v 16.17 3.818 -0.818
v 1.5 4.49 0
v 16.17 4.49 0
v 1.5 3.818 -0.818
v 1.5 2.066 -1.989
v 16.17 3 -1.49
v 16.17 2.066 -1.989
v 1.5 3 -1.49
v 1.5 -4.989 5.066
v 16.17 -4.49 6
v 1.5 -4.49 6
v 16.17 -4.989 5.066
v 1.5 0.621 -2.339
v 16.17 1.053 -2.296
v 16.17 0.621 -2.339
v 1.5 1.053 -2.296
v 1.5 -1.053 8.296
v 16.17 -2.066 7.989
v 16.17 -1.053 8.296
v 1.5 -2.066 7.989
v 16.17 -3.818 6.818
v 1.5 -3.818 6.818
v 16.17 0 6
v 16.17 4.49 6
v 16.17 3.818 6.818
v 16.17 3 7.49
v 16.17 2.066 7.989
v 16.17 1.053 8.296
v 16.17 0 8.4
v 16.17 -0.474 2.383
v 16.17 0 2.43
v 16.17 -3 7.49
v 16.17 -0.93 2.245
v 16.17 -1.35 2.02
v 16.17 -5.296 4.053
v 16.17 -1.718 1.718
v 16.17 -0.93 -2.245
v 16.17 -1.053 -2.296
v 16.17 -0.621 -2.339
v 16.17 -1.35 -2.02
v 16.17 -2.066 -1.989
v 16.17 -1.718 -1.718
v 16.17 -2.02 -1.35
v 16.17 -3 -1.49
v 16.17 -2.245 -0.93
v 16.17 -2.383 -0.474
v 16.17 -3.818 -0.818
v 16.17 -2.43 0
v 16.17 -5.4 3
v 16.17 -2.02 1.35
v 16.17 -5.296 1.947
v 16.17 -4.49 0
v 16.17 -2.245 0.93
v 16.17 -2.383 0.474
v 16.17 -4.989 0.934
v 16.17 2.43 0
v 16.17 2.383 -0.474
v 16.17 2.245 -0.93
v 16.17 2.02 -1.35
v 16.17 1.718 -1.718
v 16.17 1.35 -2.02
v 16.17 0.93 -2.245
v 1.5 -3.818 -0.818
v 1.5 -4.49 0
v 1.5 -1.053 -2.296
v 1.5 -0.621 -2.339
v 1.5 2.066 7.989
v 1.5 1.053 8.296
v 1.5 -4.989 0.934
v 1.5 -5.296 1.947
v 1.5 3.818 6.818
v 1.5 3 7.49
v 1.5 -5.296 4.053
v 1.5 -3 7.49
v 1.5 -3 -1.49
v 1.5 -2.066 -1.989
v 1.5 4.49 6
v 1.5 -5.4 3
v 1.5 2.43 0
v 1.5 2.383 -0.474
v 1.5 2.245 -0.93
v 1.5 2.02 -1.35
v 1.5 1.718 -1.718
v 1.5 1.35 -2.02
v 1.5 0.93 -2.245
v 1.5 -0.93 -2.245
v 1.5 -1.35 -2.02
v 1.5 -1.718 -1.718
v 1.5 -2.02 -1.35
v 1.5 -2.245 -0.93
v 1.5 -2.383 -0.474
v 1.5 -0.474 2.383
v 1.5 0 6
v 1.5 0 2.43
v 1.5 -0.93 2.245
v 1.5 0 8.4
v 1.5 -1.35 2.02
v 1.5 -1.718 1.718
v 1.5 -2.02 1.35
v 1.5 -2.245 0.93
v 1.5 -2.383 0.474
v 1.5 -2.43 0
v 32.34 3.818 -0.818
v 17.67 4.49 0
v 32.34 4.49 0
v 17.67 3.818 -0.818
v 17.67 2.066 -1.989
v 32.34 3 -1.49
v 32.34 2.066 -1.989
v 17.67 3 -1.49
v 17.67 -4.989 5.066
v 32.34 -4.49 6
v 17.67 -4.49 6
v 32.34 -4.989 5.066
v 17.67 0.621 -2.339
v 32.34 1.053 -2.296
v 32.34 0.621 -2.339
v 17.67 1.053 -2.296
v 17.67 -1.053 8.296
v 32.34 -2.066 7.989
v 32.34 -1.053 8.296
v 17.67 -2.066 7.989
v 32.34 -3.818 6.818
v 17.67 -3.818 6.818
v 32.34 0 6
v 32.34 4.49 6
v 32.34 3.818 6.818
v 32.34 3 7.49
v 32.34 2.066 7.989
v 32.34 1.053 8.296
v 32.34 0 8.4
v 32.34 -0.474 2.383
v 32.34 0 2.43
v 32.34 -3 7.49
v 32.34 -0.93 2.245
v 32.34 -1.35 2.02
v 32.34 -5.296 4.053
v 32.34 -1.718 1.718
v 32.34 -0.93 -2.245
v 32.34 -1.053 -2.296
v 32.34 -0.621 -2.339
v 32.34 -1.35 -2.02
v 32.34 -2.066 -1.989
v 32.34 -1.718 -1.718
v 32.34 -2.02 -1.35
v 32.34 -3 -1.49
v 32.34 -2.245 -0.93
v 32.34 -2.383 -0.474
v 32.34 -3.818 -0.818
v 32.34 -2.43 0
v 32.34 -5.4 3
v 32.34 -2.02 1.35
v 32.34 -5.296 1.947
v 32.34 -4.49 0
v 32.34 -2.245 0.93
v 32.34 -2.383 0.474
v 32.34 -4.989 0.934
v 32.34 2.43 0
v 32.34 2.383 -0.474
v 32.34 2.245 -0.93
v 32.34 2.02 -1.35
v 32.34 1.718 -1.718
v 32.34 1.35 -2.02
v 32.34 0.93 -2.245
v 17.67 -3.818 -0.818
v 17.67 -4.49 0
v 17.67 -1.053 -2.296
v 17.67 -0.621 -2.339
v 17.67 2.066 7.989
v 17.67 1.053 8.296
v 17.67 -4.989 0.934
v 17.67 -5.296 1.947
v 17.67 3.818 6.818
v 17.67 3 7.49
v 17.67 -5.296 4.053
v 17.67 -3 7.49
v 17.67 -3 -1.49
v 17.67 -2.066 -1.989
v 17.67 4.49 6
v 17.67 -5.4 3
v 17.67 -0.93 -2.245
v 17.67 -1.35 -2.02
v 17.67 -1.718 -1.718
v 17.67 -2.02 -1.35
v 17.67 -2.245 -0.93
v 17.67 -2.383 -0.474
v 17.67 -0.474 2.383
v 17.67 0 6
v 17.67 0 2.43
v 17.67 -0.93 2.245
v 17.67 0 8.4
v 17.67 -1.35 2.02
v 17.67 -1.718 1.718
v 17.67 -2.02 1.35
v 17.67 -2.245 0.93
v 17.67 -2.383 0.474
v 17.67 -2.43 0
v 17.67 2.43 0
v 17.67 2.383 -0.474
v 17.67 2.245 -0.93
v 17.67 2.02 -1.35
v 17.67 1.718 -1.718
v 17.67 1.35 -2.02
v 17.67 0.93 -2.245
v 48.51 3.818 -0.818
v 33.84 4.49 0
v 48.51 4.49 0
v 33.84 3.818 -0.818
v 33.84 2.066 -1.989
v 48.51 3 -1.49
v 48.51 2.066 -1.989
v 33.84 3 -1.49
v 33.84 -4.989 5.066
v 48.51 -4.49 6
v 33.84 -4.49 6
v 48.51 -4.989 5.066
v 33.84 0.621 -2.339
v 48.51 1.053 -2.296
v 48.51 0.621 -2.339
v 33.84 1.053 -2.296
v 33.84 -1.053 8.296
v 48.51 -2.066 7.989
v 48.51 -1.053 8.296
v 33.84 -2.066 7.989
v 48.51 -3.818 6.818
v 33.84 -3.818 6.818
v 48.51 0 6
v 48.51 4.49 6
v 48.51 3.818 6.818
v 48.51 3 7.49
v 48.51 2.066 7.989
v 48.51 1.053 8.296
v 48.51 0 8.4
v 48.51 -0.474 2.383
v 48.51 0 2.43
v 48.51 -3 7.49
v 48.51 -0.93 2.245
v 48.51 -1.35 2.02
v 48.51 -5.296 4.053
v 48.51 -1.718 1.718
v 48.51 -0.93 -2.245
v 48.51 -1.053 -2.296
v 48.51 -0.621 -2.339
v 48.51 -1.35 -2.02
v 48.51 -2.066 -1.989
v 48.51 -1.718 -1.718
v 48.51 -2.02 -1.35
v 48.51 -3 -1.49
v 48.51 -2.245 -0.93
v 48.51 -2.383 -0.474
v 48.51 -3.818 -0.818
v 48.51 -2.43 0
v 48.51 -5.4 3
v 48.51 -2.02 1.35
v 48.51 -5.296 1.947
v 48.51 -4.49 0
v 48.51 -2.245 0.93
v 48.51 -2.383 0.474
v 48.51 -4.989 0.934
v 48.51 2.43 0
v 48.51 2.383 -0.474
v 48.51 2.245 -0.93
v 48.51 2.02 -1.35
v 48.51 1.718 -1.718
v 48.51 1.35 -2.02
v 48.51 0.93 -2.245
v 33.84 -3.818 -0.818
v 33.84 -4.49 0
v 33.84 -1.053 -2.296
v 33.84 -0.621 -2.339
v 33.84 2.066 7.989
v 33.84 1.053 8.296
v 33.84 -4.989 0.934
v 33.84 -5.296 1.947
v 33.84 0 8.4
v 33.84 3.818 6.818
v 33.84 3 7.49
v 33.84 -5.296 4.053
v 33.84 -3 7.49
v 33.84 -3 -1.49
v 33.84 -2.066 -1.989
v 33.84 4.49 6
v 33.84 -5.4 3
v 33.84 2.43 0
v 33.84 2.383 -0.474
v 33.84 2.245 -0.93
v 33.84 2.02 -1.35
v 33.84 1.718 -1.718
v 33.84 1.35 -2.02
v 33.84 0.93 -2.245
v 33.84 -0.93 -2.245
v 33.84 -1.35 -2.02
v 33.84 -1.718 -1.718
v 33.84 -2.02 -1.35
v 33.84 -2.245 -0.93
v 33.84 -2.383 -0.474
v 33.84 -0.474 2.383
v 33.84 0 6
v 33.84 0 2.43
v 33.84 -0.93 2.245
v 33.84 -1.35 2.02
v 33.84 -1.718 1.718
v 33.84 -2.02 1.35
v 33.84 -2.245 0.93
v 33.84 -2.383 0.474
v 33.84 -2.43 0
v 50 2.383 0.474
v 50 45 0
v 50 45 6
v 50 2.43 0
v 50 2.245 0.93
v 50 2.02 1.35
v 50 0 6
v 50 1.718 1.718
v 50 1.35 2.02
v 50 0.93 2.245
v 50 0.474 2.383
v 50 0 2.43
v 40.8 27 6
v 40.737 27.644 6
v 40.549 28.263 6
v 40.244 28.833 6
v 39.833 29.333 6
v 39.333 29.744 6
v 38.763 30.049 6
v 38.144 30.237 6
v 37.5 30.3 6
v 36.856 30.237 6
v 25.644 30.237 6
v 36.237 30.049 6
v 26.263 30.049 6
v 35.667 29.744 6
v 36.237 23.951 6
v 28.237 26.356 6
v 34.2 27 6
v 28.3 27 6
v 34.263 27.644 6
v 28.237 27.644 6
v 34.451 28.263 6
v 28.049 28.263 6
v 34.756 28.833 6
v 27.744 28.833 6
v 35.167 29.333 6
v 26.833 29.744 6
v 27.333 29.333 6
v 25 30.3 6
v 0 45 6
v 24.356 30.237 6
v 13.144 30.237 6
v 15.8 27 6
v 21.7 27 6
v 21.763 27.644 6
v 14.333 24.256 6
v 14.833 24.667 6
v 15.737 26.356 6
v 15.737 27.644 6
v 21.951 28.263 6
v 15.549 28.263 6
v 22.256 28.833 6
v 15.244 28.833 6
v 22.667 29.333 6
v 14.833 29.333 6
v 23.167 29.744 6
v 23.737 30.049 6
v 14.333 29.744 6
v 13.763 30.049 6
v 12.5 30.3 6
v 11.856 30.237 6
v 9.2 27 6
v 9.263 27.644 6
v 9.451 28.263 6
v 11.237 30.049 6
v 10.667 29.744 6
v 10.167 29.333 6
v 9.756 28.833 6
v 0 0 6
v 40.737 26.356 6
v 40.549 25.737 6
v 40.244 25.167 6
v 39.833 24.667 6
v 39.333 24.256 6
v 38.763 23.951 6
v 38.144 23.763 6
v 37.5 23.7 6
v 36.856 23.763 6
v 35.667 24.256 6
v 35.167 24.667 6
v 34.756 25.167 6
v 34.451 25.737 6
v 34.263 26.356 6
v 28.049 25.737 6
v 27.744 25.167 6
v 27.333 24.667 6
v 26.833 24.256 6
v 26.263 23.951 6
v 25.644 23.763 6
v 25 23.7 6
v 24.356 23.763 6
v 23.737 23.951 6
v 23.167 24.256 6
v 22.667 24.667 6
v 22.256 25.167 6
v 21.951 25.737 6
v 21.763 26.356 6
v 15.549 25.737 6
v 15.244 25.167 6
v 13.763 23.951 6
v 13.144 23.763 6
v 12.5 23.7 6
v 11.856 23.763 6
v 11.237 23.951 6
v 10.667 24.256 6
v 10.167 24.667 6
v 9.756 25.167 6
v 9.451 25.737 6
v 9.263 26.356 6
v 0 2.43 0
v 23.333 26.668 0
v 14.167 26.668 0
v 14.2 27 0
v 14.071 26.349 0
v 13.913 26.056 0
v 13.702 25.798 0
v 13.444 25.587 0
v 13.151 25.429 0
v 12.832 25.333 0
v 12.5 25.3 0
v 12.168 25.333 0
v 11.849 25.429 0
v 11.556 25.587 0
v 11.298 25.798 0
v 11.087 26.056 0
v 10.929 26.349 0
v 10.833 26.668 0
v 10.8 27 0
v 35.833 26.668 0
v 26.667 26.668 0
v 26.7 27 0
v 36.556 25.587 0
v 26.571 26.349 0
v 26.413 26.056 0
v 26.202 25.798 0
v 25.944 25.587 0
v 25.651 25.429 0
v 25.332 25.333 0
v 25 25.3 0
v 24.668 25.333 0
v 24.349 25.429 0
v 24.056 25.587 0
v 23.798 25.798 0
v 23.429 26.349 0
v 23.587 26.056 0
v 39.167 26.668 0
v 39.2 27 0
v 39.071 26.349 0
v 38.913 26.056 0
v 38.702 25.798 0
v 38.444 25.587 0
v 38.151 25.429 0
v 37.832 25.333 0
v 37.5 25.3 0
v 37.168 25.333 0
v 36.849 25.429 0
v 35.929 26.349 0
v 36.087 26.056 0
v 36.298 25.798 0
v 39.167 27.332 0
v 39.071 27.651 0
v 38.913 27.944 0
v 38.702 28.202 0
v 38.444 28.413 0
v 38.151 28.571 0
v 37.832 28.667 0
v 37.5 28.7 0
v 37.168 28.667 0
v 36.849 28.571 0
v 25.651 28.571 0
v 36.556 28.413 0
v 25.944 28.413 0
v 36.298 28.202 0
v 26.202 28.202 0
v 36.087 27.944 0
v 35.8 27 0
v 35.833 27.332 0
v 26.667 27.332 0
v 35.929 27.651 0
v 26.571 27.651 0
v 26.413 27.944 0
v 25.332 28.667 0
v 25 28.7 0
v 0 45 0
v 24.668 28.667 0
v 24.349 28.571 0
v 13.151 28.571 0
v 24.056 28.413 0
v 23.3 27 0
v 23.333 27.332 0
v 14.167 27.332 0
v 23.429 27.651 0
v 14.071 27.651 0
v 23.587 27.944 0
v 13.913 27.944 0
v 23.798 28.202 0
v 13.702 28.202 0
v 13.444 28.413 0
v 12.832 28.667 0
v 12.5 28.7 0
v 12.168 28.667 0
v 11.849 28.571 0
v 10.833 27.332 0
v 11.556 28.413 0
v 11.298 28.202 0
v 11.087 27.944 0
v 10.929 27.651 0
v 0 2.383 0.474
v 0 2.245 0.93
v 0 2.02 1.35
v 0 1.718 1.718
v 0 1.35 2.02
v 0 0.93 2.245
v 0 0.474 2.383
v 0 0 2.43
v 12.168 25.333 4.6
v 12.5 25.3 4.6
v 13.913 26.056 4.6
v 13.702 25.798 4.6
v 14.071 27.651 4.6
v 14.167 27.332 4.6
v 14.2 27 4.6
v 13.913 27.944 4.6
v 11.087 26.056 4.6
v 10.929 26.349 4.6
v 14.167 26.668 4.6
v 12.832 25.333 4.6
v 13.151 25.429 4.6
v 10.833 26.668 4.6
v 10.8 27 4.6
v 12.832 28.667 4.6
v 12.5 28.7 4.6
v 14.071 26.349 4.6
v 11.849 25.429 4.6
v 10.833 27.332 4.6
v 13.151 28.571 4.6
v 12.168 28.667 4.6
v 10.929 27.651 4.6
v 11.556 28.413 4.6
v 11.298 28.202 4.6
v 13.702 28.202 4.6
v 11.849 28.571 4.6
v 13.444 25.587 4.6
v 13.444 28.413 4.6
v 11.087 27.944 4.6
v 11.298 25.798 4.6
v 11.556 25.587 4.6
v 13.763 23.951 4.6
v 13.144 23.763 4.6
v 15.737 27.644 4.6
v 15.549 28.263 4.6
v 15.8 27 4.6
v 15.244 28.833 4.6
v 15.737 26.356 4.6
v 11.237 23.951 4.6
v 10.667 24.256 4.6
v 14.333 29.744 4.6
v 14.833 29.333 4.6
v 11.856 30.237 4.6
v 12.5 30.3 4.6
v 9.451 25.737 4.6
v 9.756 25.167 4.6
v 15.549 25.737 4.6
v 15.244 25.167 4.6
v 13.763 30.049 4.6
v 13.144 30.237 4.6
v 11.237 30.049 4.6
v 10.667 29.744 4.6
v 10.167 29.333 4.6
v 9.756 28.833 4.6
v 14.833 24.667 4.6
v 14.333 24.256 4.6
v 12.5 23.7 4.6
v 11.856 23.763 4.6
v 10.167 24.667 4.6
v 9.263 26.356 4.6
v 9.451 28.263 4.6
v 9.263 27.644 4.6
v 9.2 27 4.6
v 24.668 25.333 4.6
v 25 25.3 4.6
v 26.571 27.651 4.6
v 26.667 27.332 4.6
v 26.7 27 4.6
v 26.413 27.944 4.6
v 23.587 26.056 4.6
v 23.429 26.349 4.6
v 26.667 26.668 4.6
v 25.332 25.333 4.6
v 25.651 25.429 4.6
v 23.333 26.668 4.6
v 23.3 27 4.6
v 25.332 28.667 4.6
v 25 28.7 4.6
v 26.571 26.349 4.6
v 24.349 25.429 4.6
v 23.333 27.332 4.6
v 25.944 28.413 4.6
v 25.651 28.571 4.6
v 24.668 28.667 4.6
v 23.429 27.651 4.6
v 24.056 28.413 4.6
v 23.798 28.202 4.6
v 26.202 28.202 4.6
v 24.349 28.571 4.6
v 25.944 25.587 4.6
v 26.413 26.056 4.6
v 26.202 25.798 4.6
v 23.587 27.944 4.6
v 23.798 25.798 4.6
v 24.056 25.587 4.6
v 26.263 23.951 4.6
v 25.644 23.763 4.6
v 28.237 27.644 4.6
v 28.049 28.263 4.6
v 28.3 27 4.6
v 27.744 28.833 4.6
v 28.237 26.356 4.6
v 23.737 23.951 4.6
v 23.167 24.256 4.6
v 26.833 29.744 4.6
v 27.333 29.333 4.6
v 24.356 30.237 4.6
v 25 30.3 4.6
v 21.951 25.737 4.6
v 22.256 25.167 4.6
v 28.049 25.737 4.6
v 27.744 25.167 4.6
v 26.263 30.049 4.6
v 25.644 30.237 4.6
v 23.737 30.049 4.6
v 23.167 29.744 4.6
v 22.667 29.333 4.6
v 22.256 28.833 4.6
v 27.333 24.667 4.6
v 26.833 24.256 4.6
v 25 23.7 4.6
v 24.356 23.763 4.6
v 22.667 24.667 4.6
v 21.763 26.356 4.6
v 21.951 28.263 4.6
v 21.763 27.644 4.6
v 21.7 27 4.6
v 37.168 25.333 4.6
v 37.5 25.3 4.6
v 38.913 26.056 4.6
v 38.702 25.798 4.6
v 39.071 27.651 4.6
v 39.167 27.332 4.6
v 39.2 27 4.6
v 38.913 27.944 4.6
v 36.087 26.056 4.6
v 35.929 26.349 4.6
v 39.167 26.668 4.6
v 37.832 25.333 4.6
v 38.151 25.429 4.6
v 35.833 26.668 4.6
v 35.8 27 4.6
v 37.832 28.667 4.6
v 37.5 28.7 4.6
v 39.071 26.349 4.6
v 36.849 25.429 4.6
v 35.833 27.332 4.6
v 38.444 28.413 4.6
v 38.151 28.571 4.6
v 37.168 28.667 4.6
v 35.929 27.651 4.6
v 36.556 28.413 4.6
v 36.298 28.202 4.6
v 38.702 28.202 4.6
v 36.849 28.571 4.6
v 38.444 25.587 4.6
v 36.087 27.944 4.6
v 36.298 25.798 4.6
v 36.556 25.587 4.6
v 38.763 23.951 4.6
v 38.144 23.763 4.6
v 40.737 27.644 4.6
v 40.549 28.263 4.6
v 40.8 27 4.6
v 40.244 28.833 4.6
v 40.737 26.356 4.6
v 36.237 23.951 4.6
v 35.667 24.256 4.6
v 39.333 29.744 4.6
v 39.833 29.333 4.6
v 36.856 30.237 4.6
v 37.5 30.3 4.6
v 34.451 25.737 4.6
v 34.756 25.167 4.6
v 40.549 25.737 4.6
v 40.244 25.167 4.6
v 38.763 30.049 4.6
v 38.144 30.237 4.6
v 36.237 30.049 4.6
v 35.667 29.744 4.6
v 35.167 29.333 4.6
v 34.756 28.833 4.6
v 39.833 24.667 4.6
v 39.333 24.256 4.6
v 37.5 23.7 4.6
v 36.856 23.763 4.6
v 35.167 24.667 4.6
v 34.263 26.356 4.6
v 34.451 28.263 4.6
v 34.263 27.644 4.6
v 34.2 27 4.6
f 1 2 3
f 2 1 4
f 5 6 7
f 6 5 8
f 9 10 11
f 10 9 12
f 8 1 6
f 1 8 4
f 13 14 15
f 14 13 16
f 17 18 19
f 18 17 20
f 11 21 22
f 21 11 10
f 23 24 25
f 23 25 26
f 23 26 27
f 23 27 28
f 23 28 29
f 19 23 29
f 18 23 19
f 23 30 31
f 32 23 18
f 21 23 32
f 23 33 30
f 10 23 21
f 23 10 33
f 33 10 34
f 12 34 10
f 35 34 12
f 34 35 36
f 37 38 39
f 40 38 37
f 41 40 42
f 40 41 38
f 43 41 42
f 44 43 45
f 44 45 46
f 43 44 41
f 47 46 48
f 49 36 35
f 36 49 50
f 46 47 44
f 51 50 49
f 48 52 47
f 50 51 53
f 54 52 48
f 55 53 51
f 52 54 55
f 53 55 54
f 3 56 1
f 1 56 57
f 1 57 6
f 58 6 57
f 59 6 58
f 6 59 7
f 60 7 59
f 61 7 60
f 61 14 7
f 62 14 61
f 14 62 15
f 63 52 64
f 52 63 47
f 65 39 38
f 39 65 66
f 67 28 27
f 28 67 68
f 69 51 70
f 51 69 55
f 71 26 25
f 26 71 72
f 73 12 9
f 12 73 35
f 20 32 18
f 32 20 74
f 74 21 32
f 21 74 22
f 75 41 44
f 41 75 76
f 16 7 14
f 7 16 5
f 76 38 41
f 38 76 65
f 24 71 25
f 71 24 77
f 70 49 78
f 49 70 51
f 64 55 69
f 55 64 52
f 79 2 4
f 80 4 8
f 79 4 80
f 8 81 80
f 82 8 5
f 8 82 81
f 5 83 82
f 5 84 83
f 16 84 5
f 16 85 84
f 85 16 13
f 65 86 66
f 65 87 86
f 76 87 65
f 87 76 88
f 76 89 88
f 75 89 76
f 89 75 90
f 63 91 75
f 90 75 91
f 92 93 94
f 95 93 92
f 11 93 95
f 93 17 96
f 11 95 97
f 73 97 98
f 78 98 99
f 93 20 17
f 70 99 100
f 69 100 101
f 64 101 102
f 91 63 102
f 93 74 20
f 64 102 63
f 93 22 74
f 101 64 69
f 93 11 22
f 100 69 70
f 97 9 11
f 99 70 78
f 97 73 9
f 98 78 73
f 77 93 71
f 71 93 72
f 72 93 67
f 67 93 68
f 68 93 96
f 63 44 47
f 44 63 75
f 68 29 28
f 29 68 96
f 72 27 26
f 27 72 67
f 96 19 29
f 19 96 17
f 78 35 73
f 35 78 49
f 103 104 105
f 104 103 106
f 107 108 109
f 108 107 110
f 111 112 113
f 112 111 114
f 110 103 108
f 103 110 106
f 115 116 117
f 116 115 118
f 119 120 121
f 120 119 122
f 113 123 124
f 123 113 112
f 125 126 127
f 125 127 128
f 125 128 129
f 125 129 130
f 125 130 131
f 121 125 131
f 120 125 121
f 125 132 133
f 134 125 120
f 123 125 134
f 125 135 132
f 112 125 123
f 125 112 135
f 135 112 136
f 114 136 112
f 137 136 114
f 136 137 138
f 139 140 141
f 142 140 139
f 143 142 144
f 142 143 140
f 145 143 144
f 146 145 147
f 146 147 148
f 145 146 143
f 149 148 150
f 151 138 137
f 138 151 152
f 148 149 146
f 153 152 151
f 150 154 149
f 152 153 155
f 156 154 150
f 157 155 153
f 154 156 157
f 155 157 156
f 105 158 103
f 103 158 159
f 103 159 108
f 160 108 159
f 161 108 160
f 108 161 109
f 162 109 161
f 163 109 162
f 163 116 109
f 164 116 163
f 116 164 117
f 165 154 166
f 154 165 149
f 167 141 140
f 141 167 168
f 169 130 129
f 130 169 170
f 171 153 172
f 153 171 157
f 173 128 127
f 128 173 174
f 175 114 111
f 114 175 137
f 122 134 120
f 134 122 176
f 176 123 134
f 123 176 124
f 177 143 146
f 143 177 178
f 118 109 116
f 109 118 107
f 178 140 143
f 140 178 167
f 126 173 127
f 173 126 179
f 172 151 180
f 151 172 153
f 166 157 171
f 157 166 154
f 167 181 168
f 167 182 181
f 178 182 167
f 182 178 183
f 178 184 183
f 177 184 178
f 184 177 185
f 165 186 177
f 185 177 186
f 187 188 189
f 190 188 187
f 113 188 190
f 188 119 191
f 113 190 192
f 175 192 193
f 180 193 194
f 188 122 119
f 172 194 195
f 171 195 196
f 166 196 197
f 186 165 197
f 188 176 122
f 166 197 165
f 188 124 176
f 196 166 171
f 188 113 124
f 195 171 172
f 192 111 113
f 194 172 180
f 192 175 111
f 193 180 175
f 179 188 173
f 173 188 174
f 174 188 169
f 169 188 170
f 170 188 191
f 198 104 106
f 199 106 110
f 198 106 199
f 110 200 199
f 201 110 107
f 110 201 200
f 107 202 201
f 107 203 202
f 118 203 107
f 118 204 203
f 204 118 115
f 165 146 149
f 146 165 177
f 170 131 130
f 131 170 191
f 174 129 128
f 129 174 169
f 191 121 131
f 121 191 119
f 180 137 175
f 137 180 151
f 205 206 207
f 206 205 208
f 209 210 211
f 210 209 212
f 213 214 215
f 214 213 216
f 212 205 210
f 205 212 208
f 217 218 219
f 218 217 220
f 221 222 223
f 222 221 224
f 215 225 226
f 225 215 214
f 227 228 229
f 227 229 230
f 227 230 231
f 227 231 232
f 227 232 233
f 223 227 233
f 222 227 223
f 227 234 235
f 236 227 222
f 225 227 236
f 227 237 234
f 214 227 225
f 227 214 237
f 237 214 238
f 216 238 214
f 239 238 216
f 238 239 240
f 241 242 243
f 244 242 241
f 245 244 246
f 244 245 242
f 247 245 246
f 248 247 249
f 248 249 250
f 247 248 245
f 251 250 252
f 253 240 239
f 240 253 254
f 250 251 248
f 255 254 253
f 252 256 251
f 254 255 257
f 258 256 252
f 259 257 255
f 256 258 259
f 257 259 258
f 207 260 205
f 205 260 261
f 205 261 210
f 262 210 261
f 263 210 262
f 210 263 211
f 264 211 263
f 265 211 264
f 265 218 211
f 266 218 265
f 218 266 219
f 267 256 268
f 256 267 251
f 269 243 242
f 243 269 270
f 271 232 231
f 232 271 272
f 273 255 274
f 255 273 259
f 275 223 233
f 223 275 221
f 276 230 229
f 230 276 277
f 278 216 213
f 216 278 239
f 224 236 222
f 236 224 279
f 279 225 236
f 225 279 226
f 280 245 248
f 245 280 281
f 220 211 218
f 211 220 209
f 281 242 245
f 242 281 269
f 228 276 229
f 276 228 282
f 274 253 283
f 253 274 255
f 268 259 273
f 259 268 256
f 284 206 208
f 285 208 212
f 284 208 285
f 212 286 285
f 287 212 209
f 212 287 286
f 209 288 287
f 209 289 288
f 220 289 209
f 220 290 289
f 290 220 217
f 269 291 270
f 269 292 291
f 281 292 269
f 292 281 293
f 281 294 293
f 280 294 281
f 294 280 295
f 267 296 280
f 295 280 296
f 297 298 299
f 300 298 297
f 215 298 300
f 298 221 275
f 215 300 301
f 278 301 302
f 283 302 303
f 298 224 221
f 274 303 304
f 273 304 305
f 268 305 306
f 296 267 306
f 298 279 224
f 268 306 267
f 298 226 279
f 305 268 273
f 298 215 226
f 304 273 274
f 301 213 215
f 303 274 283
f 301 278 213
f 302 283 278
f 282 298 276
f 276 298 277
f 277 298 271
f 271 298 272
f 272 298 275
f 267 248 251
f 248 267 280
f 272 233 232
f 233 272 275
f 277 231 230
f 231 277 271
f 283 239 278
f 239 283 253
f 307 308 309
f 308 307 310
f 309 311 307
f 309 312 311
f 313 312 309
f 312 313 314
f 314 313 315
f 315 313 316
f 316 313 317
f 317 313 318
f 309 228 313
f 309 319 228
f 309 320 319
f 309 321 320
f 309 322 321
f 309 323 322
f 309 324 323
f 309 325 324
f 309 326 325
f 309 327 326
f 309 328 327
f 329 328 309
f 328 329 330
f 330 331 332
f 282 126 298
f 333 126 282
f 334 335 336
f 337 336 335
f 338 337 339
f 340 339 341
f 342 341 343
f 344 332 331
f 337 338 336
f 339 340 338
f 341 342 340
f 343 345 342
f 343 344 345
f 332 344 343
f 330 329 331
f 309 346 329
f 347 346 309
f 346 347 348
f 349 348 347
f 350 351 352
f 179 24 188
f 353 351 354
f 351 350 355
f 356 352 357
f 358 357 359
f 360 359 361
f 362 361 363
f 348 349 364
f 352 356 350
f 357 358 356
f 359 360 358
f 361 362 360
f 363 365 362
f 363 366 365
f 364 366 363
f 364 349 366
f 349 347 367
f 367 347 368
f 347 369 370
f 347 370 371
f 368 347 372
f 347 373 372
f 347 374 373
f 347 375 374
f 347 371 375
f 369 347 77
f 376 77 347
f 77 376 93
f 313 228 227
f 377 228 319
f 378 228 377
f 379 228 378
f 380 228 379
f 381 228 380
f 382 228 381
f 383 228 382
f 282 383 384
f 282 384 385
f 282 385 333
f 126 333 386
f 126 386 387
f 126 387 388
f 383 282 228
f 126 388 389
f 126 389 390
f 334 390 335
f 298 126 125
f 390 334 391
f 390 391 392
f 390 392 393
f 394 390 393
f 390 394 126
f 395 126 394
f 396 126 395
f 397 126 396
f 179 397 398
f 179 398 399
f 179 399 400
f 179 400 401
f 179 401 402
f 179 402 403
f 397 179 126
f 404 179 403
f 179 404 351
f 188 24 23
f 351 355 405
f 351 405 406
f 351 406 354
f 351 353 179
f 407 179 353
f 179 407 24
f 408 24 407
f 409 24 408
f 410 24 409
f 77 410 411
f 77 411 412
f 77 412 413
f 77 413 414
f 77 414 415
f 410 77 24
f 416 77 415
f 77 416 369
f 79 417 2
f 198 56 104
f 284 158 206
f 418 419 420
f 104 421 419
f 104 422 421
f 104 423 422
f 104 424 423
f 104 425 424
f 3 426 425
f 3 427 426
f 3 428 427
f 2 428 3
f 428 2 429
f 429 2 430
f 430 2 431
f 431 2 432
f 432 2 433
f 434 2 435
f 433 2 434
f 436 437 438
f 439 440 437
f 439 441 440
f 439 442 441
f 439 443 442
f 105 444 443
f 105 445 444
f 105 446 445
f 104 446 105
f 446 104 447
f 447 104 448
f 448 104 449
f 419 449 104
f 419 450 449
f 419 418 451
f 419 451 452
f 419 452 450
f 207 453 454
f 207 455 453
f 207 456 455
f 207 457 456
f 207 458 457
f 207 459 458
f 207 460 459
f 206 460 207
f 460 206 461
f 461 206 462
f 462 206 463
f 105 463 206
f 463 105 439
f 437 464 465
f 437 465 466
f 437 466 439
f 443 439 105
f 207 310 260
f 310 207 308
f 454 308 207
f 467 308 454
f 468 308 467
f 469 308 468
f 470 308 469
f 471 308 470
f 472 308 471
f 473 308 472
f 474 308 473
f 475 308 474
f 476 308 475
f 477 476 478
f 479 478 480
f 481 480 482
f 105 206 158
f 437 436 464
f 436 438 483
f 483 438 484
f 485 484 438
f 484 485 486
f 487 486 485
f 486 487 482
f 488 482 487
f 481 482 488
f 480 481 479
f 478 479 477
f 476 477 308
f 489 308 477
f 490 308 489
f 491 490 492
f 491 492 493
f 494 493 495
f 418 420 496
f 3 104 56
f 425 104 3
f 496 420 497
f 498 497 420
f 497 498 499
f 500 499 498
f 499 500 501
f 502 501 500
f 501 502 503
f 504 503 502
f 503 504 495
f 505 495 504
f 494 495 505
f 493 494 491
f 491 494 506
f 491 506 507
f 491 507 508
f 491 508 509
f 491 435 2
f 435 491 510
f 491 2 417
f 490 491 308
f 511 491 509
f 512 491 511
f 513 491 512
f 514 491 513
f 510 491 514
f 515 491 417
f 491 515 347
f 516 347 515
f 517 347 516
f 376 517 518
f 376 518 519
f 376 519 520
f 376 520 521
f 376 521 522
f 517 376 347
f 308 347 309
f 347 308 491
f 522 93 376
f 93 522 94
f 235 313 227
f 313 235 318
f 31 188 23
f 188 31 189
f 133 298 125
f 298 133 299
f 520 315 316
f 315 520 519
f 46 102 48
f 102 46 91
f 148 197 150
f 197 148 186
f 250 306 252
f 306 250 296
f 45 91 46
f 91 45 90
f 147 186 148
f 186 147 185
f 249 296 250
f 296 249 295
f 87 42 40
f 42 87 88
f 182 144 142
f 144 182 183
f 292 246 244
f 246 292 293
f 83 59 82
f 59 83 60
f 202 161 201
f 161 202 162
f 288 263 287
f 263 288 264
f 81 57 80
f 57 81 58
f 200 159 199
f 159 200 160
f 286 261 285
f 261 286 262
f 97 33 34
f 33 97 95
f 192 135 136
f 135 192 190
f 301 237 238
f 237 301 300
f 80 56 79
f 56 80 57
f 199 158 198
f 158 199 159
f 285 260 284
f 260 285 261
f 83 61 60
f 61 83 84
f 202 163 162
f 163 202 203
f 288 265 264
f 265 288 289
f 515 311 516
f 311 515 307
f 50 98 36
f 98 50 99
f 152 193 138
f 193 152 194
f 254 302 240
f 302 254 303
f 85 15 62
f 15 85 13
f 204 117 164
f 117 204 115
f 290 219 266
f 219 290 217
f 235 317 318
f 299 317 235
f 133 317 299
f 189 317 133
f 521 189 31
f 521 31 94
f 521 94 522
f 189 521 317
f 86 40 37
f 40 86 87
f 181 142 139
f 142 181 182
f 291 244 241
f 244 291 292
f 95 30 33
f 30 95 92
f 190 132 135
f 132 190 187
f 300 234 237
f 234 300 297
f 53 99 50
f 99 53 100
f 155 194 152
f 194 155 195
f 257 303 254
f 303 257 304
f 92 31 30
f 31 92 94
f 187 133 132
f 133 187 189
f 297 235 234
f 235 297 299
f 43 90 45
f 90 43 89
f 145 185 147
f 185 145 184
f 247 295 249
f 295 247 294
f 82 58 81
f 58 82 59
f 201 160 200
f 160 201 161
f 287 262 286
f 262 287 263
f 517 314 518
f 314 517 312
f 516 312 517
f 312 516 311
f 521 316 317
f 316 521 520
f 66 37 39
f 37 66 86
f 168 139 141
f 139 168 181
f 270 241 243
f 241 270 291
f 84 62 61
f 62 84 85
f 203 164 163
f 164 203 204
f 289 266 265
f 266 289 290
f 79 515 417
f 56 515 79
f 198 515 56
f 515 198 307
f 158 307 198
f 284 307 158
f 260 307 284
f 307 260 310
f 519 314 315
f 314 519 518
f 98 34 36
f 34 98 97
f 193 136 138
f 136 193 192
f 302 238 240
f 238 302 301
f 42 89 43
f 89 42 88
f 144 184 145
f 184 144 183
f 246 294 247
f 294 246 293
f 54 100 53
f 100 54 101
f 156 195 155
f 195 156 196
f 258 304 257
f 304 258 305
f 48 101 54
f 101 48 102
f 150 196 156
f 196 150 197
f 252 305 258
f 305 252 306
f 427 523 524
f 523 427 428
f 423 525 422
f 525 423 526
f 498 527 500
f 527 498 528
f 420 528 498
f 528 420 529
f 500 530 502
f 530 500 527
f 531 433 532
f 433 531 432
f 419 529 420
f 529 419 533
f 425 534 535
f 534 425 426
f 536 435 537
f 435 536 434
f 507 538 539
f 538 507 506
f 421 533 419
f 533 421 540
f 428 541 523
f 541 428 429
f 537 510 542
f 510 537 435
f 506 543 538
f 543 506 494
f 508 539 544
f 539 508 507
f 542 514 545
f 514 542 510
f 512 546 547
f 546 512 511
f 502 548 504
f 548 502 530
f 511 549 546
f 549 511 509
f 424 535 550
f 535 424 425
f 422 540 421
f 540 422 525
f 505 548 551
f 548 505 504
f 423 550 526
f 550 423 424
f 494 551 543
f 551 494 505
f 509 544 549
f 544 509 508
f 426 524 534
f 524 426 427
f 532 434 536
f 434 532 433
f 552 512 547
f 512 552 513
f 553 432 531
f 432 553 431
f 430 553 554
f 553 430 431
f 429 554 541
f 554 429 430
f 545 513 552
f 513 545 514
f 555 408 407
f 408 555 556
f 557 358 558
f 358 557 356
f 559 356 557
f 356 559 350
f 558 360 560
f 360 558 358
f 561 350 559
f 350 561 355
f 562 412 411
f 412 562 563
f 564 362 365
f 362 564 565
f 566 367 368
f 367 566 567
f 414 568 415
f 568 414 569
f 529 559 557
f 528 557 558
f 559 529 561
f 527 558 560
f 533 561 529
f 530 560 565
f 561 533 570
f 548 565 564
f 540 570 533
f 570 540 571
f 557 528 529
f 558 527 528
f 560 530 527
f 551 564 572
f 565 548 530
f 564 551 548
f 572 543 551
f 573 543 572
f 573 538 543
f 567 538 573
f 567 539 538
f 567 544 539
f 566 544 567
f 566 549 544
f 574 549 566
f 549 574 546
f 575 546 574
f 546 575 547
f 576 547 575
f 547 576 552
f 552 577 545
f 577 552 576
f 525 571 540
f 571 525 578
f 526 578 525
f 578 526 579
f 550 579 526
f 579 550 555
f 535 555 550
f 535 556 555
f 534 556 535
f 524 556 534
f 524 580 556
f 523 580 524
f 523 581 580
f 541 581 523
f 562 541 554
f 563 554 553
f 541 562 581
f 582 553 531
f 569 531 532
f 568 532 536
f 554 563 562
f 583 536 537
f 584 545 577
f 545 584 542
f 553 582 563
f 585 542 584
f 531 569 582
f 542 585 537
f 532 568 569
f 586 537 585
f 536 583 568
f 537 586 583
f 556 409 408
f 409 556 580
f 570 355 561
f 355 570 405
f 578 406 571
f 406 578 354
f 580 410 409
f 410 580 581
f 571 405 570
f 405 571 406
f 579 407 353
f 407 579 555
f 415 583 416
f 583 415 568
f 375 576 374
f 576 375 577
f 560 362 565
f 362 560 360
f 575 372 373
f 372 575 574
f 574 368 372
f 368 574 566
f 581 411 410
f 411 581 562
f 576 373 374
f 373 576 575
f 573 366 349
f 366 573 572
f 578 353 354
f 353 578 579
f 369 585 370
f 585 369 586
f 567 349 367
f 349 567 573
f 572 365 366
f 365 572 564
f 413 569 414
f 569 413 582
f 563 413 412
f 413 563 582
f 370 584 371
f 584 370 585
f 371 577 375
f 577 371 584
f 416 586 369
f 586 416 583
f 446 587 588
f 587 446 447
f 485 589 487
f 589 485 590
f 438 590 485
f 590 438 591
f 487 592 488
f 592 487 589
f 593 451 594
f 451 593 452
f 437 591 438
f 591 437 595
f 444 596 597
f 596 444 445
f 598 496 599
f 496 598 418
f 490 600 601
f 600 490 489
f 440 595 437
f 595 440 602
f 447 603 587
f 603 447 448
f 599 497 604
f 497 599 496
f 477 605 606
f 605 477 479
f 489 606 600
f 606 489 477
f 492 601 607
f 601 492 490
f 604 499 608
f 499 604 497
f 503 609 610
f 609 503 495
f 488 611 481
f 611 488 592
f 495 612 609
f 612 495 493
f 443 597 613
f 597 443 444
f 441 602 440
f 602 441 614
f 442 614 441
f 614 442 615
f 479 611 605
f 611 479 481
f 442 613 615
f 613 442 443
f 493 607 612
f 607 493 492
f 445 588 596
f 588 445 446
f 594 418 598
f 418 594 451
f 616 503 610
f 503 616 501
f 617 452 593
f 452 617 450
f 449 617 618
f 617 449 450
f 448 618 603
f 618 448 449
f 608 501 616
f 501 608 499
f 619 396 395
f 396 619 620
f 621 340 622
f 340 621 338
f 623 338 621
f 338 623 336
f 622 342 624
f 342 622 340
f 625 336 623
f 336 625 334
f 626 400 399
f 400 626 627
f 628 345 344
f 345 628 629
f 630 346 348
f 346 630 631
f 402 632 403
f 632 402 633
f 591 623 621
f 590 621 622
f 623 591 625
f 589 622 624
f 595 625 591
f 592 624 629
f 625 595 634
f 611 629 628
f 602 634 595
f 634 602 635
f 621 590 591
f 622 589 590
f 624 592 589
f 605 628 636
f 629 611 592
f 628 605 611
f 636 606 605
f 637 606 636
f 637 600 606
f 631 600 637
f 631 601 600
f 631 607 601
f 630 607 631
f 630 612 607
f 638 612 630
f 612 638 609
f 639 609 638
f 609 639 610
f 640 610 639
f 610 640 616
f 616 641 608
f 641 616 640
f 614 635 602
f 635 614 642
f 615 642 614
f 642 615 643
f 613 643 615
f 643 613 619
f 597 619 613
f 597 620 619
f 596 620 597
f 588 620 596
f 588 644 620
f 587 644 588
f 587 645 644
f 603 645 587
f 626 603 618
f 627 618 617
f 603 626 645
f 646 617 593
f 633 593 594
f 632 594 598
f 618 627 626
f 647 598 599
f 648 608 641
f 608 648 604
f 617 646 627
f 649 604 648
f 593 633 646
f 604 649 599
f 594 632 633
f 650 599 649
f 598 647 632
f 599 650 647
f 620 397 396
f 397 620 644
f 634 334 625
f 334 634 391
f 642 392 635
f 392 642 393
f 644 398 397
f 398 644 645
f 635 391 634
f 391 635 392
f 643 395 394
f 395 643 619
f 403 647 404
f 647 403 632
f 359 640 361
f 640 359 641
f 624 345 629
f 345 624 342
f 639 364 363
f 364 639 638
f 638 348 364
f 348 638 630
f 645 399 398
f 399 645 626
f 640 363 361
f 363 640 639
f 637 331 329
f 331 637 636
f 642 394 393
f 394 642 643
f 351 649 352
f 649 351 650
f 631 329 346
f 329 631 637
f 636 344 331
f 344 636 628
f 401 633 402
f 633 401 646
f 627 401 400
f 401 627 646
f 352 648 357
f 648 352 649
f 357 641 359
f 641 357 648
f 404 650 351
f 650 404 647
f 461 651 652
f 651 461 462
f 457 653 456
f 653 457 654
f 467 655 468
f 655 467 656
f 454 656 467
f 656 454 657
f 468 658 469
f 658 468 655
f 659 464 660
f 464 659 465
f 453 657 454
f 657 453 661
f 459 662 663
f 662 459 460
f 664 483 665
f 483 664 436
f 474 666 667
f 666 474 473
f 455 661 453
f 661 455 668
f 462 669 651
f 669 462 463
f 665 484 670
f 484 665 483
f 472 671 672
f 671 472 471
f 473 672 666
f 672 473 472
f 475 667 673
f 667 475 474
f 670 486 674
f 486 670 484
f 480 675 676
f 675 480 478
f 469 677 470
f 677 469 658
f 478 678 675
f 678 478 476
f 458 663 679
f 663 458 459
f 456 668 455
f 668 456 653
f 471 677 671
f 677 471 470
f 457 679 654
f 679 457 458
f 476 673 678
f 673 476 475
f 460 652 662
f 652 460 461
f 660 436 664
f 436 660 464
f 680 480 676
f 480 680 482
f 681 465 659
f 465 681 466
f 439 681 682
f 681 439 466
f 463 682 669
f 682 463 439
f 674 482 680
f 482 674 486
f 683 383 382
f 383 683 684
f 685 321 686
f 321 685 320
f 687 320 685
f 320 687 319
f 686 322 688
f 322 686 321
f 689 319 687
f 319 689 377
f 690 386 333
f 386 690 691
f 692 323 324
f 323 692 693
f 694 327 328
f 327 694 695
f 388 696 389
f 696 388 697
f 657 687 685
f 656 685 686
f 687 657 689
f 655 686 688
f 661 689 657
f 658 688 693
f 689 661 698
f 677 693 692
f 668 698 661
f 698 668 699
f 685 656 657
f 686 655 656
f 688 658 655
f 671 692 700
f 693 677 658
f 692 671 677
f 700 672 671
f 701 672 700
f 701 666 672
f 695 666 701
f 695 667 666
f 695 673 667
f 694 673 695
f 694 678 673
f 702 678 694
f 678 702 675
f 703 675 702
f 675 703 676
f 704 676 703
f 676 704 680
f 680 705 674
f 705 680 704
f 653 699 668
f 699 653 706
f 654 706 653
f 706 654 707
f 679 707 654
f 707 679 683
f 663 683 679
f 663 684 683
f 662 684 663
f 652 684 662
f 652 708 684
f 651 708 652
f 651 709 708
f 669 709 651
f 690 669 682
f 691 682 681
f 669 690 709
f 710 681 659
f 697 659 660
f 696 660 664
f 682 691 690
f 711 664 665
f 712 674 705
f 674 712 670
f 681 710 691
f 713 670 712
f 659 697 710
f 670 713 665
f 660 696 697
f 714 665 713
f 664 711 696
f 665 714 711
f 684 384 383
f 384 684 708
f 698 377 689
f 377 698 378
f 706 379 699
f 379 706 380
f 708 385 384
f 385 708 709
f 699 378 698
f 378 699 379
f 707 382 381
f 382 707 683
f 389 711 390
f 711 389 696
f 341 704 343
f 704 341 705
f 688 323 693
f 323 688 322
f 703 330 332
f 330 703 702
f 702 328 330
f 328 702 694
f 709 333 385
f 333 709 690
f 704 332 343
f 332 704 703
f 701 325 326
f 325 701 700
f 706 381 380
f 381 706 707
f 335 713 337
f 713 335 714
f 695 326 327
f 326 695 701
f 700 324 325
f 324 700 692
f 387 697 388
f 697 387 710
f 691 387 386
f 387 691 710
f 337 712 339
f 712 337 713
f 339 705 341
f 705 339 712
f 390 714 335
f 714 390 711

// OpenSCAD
$fn = 32;

// ----------------------------------------------------------------------
// Hinge leaf: 50 x 50.4 x 10.8 mm
// ----------------------------------------------------------------------

// --- parameters (mm) ---
plate_len = 50;           // leaf length, X
plate_w = 45;             // leaf width, Y
plate_t = 6;              // leaf thickness
barrel_d = 10.8;          // knuckle diameter
barrel_w = 14.67;         // knuckle width
knuckle_n = 3;            // number of knuckles
pin_d = 4.86;             // pin bore
gap = 1.5;                // gap between the knuckles
screw_d = 3.4;            // screw clearance
cs_d = 6.6;               // countersink diameter
cs_h = 1.4;               // countersink depth

module leaf() {
  cube([plate_len, plate_w, plate_t]);
}

module knuckles() {
  /* barrels sit on the leaf edge, the pin axis at half the leaf thickness */
  for (i = [0 : knuckle_n - 1])
    translate([gap + i * (barrel_w + gap), 0, plate_t * 0.5])
      rotate([0, 90, 0]) cylinder(h = barrel_w, d = barrel_d);
}

difference() {
  union() {
    leaf();
    knuckles();
  }
  rotate([0, 90, 0]) translate([0, 0, -1])
    cylinder(h = plate_len + 2, d = pin_d);
  translate([12.5, plate_w * 0.6, -1]) cylinder(h = plate_t + 2, d = screw_d);
  translate([12.5, plate_w * 0.6, plate_t - cs_h]) cylinder(h = cs_h + 0.5, d = cs_d);
  translate([25, plate_w * 0.6, -1]) cylinder(h = plate_t + 2, d = screw_d);
  translate([25, plate_w * 0.6, plate_t - cs_h]) cylinder(h = cs_h + 0.5, d = cs_d);
  translate([37.5, plate_w * 0.6, -1]) cylinder(h = plate_t + 2, d = screw_d);
  translate([37.5, plate_w * 0.6, plate_t - cs_h]) cylinder(h = cs_h + 0.5, d = cs_d);
}
